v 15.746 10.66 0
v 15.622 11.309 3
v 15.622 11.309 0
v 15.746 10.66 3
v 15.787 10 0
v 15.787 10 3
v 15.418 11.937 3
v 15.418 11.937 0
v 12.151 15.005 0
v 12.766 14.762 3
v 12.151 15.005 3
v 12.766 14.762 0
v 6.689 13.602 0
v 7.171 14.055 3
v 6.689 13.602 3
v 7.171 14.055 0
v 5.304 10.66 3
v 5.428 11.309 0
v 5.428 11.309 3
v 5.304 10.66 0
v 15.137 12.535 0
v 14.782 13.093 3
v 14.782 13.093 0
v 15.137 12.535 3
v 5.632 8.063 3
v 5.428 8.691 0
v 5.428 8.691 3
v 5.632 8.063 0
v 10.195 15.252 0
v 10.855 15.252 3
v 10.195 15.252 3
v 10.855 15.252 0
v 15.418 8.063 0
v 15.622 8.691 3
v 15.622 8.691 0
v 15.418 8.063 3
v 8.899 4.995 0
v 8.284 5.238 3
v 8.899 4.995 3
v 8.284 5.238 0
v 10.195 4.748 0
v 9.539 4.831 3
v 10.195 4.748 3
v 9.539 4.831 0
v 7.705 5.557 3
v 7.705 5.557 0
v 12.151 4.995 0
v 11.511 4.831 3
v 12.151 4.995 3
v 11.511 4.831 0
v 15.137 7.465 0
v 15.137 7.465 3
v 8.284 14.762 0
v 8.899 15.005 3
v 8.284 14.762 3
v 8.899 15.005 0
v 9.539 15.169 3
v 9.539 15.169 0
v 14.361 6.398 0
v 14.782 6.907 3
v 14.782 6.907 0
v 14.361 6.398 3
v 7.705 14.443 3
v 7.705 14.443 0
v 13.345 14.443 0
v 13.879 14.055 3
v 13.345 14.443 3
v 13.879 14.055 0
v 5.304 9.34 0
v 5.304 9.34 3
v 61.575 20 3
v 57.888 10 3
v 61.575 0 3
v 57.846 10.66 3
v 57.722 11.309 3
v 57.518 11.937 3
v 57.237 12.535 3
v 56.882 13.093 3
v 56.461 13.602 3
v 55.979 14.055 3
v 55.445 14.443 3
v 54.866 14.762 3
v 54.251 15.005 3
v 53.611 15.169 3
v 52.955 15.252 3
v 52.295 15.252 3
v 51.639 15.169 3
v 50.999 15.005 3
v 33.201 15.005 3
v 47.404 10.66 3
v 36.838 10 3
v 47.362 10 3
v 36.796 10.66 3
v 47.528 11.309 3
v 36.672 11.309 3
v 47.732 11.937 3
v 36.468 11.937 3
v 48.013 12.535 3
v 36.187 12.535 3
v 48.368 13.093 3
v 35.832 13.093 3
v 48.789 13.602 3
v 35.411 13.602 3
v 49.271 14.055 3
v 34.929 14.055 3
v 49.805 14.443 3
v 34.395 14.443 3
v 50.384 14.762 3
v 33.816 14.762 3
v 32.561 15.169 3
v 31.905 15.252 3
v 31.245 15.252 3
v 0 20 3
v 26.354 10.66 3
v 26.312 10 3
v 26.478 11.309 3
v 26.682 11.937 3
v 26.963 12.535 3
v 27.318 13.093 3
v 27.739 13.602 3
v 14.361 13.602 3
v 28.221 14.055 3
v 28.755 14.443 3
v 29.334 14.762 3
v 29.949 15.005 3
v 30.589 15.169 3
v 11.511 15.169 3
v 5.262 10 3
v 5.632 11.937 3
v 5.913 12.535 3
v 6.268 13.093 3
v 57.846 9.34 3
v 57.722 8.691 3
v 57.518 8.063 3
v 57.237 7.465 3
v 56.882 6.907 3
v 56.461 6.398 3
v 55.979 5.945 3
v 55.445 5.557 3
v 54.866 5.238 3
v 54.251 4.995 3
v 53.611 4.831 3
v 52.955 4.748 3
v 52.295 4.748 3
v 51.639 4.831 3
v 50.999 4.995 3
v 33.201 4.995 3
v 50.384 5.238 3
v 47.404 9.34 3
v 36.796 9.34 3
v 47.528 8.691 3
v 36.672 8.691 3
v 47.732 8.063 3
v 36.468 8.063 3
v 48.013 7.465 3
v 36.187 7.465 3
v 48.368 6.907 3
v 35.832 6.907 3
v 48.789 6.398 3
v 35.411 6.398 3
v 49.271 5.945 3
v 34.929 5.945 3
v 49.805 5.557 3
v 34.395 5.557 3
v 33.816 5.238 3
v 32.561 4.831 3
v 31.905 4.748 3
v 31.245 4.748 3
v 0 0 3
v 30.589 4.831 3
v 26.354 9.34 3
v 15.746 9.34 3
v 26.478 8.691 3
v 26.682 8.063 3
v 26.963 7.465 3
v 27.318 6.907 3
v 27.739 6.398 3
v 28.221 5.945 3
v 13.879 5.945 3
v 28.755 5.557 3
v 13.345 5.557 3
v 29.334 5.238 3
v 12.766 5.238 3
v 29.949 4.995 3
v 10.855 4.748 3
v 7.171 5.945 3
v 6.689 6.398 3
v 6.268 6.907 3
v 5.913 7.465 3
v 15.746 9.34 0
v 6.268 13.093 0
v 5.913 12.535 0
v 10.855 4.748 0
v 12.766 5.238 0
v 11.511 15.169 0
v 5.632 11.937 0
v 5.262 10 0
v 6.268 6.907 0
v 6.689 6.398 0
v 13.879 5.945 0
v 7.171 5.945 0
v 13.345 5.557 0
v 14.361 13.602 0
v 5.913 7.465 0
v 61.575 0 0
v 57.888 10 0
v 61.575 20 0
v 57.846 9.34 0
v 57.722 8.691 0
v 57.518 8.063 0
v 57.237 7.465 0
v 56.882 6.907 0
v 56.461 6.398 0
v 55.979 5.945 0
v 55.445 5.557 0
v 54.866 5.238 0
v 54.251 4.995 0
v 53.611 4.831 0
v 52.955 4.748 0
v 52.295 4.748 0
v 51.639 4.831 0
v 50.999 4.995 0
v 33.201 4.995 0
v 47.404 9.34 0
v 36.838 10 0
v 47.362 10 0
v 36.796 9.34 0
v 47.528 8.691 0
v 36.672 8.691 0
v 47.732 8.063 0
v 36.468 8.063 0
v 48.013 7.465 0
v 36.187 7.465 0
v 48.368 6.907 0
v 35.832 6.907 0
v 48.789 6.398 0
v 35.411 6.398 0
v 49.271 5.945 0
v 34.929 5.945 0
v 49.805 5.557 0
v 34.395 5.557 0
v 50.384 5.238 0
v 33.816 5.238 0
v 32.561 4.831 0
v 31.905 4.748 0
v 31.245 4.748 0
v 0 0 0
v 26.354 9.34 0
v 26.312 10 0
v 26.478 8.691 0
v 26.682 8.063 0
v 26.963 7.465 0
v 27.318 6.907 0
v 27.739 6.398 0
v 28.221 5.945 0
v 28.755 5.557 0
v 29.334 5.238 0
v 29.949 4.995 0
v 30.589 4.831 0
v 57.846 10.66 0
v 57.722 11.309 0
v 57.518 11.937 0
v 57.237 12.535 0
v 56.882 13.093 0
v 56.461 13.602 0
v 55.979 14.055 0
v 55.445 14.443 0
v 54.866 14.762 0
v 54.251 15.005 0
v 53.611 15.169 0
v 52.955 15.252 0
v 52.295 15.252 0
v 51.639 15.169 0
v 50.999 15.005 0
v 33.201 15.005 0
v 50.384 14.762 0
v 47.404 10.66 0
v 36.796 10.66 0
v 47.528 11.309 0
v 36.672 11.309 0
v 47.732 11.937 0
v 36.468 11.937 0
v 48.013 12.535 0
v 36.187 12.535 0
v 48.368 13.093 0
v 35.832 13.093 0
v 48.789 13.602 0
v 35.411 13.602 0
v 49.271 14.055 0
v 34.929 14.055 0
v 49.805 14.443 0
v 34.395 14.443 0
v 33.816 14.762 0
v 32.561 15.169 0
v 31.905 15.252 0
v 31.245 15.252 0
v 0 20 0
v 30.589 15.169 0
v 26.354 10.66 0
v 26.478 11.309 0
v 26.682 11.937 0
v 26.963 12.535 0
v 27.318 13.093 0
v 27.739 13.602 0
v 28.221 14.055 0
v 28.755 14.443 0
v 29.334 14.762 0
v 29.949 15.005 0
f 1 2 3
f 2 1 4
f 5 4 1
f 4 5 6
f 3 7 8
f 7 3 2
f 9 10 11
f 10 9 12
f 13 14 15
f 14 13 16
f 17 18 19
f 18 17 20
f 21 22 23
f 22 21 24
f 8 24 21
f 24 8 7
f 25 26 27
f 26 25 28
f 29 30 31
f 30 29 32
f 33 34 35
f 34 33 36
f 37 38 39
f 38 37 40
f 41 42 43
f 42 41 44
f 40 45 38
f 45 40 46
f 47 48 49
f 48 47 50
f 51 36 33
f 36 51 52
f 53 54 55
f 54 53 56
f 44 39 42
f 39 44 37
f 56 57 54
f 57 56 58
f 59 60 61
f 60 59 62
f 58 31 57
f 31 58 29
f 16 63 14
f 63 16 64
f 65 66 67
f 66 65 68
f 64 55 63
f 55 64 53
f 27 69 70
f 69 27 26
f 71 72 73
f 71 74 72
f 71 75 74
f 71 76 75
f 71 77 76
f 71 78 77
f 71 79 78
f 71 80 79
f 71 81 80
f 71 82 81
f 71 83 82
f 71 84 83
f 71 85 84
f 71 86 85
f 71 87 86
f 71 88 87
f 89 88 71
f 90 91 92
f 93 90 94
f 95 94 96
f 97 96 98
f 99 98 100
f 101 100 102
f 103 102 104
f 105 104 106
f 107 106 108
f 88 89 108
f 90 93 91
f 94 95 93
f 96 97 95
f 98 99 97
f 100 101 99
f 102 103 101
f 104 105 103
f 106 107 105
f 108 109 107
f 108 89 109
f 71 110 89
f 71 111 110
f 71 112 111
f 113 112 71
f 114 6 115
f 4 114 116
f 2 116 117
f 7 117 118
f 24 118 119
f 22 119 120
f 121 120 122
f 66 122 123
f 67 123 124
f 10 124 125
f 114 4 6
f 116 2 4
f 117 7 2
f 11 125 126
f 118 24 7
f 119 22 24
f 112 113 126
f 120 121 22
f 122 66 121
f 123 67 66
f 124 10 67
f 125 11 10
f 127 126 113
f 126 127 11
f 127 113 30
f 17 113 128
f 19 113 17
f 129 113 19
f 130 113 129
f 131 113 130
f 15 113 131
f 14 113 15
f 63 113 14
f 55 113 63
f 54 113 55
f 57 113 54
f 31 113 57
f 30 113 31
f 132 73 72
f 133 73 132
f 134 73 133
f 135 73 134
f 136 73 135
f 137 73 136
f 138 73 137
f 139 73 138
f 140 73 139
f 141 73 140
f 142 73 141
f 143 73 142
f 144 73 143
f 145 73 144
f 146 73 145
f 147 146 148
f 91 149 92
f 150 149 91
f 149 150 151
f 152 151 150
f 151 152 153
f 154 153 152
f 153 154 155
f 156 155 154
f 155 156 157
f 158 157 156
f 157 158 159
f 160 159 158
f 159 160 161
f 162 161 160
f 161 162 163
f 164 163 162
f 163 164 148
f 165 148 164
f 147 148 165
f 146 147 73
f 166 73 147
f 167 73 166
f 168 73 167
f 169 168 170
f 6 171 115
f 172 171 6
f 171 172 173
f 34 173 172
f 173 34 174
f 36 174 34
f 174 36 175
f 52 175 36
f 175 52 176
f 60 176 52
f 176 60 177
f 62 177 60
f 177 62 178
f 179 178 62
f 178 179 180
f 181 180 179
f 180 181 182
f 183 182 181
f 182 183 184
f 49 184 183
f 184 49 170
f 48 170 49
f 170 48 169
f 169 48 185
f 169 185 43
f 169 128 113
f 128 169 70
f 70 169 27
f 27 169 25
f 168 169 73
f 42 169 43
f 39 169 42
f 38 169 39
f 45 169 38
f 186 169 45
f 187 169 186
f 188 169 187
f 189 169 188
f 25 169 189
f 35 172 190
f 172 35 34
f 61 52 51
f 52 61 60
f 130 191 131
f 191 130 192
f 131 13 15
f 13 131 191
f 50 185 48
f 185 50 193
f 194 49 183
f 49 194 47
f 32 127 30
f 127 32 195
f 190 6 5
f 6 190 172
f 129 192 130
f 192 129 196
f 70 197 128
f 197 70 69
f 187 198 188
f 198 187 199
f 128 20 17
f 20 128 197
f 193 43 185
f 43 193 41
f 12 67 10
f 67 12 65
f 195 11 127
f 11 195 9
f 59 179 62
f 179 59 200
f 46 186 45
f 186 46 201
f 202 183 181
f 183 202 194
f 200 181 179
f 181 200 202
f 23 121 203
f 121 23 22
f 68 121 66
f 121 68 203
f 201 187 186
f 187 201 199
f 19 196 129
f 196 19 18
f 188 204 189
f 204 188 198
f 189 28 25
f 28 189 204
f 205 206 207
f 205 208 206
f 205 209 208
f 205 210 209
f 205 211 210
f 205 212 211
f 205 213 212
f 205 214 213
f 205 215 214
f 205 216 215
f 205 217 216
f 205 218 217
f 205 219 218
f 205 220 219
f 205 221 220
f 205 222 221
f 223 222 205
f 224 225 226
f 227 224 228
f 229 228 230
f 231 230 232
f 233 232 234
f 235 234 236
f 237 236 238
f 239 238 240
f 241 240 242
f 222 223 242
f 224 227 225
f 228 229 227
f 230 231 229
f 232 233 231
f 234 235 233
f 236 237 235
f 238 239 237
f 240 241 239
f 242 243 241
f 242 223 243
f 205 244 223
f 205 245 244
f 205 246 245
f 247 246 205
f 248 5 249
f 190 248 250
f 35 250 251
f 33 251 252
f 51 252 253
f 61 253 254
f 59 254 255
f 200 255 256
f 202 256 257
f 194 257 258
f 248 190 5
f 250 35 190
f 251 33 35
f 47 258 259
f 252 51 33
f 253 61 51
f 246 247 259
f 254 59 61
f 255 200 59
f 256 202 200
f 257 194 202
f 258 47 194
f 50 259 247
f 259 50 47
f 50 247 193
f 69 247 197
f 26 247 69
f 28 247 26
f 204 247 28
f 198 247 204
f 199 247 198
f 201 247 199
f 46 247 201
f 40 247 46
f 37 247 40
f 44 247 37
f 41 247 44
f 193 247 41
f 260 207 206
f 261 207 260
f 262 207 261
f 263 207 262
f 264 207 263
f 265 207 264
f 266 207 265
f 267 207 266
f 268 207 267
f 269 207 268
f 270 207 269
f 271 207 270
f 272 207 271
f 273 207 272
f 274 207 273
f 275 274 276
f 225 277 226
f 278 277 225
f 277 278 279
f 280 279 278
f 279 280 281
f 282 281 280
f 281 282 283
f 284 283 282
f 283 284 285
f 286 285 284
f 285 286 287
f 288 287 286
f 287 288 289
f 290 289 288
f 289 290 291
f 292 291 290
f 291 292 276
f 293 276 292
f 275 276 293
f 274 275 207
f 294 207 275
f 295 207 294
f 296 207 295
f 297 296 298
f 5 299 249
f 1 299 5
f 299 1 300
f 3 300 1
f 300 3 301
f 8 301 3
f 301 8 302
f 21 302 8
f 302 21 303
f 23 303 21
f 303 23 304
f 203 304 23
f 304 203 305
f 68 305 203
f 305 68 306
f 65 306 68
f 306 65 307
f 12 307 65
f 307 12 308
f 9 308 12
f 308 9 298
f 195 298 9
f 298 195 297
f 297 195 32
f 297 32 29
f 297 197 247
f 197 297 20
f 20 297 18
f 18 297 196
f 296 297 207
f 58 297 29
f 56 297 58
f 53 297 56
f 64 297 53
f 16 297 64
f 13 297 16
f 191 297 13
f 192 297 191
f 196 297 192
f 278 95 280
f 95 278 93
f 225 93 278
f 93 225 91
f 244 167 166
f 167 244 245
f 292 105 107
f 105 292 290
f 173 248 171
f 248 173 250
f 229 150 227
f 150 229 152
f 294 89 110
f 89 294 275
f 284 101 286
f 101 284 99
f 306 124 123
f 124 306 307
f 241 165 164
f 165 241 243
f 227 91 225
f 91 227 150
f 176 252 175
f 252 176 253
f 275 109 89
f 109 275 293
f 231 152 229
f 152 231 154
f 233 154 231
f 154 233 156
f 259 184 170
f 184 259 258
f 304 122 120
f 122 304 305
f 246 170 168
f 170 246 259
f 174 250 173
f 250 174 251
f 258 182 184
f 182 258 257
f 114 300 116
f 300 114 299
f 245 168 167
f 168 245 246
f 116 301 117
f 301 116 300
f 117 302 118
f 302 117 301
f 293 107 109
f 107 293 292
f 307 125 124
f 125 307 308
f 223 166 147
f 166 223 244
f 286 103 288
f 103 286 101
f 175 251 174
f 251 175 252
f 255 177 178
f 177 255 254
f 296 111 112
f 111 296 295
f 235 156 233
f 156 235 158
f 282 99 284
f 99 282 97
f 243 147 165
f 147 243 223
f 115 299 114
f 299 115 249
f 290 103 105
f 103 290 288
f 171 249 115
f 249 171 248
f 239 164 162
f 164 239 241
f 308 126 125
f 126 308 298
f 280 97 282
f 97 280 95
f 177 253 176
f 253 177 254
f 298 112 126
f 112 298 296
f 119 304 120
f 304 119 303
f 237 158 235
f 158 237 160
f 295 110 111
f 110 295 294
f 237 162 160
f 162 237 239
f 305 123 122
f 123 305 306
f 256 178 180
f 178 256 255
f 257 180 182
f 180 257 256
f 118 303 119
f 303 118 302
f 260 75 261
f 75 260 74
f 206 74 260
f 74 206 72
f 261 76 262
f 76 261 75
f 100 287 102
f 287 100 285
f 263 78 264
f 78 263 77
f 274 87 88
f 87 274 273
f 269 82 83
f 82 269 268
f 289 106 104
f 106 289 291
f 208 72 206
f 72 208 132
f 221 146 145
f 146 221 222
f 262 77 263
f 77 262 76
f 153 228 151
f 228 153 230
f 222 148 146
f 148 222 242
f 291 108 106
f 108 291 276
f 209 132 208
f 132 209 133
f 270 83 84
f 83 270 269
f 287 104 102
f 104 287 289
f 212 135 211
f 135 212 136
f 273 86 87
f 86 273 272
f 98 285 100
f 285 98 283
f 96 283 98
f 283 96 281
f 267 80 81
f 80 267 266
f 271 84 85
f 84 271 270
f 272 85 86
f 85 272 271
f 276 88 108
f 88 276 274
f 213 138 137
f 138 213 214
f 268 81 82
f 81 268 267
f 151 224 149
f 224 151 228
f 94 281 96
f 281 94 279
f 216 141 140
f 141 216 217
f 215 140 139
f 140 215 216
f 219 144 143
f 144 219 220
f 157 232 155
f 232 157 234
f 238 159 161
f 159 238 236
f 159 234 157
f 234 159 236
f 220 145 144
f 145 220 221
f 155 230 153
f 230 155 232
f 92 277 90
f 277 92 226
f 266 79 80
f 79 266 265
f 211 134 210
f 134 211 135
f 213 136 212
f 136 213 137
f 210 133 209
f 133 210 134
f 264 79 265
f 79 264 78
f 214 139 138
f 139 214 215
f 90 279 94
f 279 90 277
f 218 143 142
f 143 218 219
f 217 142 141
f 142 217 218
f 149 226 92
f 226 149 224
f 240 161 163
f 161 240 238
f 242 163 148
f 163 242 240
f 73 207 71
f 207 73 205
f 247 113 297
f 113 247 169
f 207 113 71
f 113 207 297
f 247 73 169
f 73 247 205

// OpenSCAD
$fn=50;
V=3/8*25.4+1;
V2=V+10;
H=3;
difference() {
  cube([V2*3,20,H]);
  translate([0,10,0]) {
    # translate([V,0,0]) cylinder(H,d=V);
    # translate([V*3,0,0]) cylinder(H,d=V);
    # translate([V*5,0,0]) cylinder(H,d=V);
  }
}
